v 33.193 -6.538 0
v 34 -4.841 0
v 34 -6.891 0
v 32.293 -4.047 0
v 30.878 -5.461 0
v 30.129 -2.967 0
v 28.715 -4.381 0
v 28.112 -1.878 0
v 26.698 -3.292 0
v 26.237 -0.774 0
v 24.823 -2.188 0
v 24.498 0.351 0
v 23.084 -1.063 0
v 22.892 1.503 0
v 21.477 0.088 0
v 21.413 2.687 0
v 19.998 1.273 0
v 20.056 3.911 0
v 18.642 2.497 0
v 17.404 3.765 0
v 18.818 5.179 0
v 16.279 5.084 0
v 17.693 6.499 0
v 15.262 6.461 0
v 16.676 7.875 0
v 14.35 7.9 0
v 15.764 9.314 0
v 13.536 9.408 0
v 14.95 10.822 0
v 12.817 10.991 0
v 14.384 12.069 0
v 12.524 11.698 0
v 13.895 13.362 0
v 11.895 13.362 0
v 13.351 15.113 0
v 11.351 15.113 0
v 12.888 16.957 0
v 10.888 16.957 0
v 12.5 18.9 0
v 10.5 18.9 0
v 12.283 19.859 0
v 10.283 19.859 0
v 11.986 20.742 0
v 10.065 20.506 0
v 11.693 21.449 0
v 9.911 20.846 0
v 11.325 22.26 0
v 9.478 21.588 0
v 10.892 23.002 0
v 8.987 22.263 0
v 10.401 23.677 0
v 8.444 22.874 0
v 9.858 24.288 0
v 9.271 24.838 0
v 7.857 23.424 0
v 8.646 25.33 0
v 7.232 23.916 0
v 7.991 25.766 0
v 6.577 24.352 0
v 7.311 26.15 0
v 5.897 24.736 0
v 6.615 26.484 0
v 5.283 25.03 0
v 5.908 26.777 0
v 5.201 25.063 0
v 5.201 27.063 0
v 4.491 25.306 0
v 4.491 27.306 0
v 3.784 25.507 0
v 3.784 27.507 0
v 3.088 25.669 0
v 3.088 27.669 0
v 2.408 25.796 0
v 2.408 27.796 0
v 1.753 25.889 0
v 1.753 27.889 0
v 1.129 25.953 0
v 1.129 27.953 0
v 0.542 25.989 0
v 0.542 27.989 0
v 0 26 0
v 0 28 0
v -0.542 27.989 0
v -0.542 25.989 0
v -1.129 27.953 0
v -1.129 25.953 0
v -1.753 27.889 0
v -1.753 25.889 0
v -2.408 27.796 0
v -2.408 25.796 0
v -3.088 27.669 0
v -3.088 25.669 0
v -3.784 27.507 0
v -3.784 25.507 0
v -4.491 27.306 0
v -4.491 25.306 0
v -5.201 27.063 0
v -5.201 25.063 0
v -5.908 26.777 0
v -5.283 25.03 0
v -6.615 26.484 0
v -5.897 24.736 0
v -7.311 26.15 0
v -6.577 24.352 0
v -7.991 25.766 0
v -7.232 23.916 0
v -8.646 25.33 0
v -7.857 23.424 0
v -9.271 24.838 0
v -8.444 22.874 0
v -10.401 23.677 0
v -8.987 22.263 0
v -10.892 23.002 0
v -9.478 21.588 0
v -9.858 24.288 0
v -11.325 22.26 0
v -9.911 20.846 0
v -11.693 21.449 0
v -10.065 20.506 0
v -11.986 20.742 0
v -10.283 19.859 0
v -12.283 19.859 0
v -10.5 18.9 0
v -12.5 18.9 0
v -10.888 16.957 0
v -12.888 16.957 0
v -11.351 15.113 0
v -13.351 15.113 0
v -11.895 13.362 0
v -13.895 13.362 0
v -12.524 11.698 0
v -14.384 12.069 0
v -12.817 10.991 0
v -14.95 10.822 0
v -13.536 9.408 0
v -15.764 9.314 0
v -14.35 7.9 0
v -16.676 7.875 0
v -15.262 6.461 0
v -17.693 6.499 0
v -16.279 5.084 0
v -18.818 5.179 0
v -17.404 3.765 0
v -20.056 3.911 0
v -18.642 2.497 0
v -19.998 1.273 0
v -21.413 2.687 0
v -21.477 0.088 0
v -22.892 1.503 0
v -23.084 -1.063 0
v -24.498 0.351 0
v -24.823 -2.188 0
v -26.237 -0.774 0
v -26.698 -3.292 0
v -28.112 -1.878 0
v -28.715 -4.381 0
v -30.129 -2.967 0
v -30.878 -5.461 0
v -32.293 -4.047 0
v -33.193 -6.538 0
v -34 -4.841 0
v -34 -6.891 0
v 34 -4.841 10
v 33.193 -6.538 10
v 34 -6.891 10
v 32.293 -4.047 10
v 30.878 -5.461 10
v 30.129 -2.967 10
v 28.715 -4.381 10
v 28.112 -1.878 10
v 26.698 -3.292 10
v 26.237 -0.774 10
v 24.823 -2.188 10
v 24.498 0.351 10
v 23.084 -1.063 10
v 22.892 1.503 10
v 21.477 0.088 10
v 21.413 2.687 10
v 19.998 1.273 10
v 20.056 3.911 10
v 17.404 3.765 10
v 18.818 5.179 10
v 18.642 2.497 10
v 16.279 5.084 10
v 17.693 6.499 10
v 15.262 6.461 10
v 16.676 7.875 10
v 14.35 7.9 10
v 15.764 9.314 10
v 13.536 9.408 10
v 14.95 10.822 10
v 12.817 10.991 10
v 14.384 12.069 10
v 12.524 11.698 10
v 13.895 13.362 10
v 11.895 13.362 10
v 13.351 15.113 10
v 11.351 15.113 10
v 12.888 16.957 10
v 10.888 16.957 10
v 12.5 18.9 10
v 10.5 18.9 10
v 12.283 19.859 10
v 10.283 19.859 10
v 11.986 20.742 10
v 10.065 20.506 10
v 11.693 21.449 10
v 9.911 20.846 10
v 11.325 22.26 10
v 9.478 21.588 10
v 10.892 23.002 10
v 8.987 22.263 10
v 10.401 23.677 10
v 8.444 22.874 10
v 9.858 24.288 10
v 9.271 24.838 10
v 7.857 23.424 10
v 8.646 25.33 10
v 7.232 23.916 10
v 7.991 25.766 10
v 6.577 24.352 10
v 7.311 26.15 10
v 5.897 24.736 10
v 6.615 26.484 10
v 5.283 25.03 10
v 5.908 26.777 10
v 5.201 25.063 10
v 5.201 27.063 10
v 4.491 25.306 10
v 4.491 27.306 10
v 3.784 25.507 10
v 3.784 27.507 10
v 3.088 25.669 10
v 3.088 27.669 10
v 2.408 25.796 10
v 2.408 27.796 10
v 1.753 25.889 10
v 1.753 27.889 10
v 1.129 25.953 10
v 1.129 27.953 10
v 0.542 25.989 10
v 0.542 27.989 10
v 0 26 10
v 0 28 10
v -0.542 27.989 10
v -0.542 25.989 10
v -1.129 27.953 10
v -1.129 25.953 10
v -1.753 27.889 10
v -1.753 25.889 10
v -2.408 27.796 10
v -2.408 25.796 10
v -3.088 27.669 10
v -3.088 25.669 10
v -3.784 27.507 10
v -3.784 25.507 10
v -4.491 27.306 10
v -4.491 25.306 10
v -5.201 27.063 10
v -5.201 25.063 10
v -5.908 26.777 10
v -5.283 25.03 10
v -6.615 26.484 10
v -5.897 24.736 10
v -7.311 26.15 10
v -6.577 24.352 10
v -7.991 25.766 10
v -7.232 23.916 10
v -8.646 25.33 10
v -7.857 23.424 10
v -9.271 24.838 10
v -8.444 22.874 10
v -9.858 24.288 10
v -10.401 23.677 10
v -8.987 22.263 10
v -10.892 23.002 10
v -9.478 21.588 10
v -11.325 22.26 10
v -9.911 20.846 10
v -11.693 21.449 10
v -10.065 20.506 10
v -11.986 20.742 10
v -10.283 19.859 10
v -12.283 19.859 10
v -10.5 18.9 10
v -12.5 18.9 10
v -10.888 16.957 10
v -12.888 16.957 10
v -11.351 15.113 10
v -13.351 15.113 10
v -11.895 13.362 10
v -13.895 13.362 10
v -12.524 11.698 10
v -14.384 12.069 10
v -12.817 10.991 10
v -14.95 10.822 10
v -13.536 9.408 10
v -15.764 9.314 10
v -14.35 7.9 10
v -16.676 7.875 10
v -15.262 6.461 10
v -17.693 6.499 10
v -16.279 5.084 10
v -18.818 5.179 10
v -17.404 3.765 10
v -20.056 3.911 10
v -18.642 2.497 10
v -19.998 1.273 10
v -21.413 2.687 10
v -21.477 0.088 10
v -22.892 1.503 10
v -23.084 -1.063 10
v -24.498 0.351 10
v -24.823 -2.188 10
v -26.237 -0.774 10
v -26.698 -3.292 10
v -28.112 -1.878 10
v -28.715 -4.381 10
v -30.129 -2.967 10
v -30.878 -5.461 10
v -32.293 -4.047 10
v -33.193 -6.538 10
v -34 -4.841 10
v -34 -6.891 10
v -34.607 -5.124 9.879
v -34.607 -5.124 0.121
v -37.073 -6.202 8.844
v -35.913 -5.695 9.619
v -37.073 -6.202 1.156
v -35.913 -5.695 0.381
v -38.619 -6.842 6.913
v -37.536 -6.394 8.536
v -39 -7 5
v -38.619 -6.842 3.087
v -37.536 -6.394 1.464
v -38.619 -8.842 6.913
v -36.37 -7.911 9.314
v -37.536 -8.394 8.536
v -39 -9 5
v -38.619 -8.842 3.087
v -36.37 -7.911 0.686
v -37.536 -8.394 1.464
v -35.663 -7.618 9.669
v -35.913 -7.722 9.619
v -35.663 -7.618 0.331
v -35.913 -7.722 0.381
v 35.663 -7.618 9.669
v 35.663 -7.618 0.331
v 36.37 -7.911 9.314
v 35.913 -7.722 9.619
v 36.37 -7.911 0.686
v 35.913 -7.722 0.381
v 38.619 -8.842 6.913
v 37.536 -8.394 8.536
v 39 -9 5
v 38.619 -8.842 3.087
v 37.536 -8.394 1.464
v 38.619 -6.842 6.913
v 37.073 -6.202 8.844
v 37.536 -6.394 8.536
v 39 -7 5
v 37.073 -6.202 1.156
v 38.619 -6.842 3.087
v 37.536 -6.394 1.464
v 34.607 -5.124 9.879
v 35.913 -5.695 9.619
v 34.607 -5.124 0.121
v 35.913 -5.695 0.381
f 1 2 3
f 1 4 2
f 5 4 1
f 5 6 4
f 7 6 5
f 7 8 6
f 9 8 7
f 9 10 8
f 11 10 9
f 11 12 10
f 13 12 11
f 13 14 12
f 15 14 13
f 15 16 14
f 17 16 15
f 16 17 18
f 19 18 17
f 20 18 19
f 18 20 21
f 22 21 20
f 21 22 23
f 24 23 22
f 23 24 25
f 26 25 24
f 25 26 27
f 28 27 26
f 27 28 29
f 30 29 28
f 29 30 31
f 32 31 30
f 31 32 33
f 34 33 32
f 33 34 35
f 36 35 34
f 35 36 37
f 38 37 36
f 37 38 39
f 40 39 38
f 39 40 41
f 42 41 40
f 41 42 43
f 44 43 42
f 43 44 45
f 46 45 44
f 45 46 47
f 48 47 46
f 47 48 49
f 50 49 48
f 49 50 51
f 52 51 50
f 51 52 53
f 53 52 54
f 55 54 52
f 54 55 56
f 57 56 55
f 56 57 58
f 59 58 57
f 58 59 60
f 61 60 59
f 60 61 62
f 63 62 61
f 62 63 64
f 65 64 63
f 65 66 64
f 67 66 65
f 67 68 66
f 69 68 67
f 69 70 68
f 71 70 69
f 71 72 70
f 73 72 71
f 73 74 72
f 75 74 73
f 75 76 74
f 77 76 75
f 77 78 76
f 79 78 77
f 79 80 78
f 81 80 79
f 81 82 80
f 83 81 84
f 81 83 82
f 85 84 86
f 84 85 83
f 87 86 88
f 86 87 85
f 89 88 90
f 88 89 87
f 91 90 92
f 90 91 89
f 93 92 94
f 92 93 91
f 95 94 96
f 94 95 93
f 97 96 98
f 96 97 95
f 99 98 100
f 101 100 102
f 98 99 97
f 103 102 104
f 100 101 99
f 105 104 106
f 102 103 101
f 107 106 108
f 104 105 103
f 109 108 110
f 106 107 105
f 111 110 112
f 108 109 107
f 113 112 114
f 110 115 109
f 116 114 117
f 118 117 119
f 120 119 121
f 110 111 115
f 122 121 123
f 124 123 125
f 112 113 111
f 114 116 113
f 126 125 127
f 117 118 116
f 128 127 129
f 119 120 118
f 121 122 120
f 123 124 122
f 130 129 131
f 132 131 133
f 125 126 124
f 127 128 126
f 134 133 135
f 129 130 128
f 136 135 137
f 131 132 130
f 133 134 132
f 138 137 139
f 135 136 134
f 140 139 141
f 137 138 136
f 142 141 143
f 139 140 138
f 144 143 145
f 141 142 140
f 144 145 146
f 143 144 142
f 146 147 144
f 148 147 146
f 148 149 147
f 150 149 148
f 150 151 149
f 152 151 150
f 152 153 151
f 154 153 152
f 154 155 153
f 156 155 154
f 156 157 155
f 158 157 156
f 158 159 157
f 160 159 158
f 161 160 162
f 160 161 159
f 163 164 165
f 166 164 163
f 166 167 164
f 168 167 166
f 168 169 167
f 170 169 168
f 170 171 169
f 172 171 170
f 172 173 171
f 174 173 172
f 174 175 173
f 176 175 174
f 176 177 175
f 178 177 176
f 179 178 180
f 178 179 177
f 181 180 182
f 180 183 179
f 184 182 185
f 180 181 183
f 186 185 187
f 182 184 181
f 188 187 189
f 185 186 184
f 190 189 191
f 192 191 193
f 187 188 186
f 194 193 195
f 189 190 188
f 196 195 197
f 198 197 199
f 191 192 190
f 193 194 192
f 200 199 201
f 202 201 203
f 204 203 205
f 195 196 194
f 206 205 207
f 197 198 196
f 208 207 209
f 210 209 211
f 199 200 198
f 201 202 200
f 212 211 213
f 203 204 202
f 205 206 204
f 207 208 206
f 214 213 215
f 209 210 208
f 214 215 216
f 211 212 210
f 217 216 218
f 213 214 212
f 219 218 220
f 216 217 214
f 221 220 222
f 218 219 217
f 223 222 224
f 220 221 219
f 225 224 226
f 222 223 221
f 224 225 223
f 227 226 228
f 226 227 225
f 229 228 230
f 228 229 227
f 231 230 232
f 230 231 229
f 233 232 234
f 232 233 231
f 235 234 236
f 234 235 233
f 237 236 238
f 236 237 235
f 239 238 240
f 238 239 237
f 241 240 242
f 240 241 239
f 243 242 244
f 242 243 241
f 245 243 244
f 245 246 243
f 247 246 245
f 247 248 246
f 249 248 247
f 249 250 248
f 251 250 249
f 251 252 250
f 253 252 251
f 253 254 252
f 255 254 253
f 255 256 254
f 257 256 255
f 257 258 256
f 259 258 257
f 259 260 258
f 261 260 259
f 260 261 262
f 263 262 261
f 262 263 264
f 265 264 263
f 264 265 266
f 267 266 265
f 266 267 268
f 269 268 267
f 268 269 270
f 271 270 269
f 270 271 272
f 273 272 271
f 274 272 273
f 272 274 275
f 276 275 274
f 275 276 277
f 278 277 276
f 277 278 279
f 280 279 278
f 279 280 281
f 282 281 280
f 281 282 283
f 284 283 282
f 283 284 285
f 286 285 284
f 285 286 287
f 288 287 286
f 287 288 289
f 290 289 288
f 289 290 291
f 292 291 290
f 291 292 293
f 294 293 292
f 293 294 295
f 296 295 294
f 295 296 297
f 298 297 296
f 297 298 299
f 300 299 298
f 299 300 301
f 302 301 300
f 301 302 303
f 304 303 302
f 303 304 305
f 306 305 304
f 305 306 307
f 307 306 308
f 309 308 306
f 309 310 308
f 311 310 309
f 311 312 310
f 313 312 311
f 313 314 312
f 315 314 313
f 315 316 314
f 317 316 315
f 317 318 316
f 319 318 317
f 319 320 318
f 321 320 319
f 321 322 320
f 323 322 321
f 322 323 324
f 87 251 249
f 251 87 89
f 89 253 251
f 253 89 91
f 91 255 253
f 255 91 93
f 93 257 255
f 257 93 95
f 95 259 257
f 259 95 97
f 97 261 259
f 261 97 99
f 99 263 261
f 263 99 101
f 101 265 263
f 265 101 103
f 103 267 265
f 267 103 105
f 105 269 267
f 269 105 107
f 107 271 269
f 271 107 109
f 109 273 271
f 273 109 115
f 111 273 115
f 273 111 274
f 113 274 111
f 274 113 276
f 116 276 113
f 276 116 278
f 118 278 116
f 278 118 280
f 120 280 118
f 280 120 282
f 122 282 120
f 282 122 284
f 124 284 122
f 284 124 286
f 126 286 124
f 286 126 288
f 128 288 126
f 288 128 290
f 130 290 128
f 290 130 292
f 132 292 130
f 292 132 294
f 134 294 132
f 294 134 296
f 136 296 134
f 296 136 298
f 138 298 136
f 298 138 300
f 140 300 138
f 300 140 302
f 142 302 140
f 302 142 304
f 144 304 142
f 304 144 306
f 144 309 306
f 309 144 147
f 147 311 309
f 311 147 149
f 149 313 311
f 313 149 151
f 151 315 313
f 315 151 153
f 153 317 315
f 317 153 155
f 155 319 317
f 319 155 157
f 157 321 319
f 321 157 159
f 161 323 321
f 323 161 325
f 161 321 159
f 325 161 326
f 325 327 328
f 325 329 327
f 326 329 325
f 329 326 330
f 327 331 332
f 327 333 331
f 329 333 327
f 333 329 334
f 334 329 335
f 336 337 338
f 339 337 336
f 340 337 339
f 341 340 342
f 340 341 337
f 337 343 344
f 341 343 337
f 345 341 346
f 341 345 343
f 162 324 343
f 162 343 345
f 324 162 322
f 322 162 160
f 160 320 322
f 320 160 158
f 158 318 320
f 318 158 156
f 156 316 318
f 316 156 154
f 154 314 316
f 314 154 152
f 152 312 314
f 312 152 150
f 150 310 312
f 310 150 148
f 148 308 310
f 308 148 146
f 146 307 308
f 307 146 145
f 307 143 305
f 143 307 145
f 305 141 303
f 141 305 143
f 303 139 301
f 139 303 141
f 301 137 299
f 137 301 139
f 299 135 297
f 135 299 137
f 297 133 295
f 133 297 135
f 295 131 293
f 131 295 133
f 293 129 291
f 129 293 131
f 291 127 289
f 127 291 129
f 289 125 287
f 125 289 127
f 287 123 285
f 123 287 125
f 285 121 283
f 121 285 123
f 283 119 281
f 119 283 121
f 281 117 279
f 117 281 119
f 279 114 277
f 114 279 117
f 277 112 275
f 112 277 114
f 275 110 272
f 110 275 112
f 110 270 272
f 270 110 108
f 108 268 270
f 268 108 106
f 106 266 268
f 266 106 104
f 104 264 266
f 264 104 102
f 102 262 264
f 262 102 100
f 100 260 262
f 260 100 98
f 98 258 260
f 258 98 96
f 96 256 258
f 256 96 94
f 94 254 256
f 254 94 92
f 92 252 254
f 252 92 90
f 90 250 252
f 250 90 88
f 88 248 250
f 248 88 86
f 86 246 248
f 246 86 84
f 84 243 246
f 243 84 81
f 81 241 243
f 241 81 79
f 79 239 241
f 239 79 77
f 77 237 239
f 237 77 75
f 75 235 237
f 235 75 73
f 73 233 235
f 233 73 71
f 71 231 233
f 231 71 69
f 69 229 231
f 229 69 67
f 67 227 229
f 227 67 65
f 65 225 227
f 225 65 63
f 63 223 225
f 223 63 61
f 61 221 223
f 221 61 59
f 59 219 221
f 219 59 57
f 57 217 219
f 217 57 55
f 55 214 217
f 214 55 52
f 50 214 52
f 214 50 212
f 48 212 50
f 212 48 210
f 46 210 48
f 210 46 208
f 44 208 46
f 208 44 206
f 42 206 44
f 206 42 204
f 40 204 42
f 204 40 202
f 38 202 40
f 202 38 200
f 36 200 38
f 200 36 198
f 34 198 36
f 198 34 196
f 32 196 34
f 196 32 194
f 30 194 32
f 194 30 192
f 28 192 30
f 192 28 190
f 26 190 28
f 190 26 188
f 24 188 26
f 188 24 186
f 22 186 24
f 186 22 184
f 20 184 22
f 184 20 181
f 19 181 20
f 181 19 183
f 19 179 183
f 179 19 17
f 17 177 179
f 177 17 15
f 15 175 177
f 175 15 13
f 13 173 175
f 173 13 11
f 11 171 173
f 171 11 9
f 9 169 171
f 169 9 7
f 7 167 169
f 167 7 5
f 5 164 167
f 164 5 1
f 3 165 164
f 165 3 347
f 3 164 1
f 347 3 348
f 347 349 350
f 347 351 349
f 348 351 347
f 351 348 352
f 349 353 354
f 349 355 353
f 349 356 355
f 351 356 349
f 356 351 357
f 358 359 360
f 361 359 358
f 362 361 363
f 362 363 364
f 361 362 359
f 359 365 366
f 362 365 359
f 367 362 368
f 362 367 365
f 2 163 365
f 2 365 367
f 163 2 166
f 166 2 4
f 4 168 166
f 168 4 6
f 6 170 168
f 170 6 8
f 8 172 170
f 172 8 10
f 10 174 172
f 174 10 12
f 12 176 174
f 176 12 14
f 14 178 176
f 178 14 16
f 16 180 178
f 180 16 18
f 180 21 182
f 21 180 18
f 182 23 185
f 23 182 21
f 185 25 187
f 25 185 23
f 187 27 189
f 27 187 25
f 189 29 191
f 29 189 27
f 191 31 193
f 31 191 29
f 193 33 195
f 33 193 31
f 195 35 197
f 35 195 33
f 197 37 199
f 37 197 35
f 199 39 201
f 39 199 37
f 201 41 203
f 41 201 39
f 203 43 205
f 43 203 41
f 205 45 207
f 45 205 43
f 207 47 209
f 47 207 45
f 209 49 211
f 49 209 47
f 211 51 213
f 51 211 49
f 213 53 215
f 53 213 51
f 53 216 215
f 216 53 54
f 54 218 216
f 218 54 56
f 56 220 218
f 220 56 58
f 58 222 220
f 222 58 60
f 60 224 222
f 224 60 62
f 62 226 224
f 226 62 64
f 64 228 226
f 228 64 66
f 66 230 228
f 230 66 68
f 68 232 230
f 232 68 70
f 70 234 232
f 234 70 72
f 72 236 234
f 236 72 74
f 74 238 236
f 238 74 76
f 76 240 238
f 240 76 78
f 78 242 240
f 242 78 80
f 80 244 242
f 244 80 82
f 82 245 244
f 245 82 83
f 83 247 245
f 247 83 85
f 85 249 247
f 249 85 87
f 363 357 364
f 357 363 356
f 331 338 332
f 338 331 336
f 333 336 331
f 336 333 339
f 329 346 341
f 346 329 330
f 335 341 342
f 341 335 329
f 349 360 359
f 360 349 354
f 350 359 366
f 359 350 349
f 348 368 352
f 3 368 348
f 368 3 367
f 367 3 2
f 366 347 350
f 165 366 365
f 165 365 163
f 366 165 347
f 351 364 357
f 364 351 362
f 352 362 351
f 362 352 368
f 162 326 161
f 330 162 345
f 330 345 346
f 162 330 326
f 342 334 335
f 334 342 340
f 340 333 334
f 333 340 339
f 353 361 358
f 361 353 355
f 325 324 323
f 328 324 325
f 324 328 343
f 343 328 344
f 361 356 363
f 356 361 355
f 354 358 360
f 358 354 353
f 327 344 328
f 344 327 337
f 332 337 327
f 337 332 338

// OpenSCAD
// This file was processed by resolve-include.py [https://github.com/arpruss/miscellaneous-scad/blob/master/scripts/resolve-include.py] 
// to include  all the dependencies inside one file.

d1 = 23;
d3 = 78;
depth = 27;
extraDepth = 8;
angle1 = 10;
angle2 = 22;
thickness = 2;
height = 10;

module end_of_parameters_dummy() {}


//BEGIN DEPENDENCY: use <Bezier.scad>;
/*
Copyright (c) 2017 Alexander R. Pruss.

Licensed under any Creative Commons Attribution license you like or under the
following MIT License.

Permission is hereby granted, free of charge, to any person obtaining a copy
of this software and associated documentation files (the "Software"), to deal
in the Software without restriction, including without limitation the rights
to use, copy, modify, merge, publish, distribute, sublicense, and/or sell
copies of the Software, and to permit persons to whom the Software is
furnished to do so, subject to the following conditions:

The above copyright notice and this permission notice shall be included in all
copies or substantial portions of the Software.

THE SOFTWARE IS PROVIDED "AS IS", WITHOUT WARRANTY OF ANY KIND, EXPRESS OR
IMPLIED, INCLUDING BUT NOT LIMITED TO THE WARRANTIES OF MERCHANTABILITY,
FITNESS FOR A PARTICULAR PURPOSE AND NONINFRINGEMENT. IN NO EVENT SHALL THE
AUTHORS OR COPYRIGHT HOLDERS BE LIABLE FOR ANY CLAIM, DAMAGES OR OTHER
LIABILITY, WHETHER IN AN ACTION OF CONTRACT, TORT OR OTHERWISE, ARISING FROM,
OUT OF OR IN CONNECTION WITH THE SOFTWARE OR THE USE OR OTHER DEALINGS IN THE
SOFTWARE.

*/


// Public domain Bezier stuff from www.thingiverse.com/thing:8443
function BEZ03(u) = pow(1-u, 3);
function BEZ13(u) = 3*u*pow(1-u,2);
function BEZ23(u) = 3*pow(u,2)*(1-u);
function BEZ33(u) = pow(u,3);
function PointAlongBez4(p0, p1, p2, p3, u) =
	BEZ03(u)*p0+BEZ13(u)*p1+BEZ23(u)*p2+BEZ33(u)*p3;
// End public domain Bezier stuff
function d2BEZ03(u) = 6*(1-u);
function d2BEZ13(u) = 18*u-12;
function d2BEZ23(u) = -18*u+6;
function d2BEZ33(u) = 6*u;

function worstCase2ndDerivative(p0, p1, p2, p3, u1, u2)
    = norm([
        for(i=[0:len(p0)-1])
            max([for(u=[u1,u2])
                d2BEZ03(u)*p0[i]+d2BEZ13(u)*p1[i]+
                d2BEZ23(u)*p2[i]+d2BEZ33(u)*p3[i]]) ]);

function neededIntervalLength(p0,p1,p2,p3,u1,u2,tolerance)
    = let(d2=worstCase2ndDerivative(p0,p1,p2,p3,u1,u2))
        d2==0 ? u2-u1+1 : sqrt(2*tolerance/d2);

function REPEAT_MIRRORED(v,angleStart=0,angleEnd=360) = ["m",v,angleStart,angleEnd];
function SMOOTH_REL(x) = ["r",x];
function SMOOTH_ABS(x) = ["a",x];
function SYMMETRIC() = ["r",1];
function OFFSET(v) = ["o",v];
function SHARP() = OFFSET([0,0,0]);
function LINE() = ["l",0];
function POLAR(r,angle) = OFFSET(r*[cos(angle),sin(angle)]);
//function POINT_IS_SPECIAL(v) = (v[0]=="r" || v[0]=="a" || v[0]=="o" || v[0]=="l");

// this does NOT handle offset type points; to handle those, use DecodeBezierOffsets()
function getControlPoint(cp,node,otherCP,otherNode,nextNode) =
    let(v=node-otherCP) (
    cp[0]=="r" ? node+cp[1]*v:
    cp[0]=="a" ? (
        norm(v)<1e-9 ? node+cp[1]*(node-otherNode)/norm(node-otherNode) : node+cp[1]*v/norm(v) ) :
        cp );

function onLine2(a,b,c,eps=1e-4) =
    norm(c-a) <= eps ? true
        : norm(b-a) <= eps ? false /* to be safe */
            : abs((c[1]-a[1])*(b[0]-a[0]) - (b[1]-a[1])*(c[0]-a[0])) <= eps * eps && norm(c-a) <= eps + norm(b-a);

function isStraight2(p1,c1,c2,p2,eps=1e-4) =
    len(p1) == 2 &&
    onLine2(p1,p2,c1,eps=eps) && onLine2(p2,p1,c2,eps=eps);

function Bezier2(p,index=0,precision=0.05,rightEndPoint=true,optimize=true) = let(nPoints=
        max(1, precision < 0 ?
                    ceil(1/
                        neededIntervalLength(p[index],p[index+1],p[index+2],p[index+3],0,1,-precision))
                    : ceil(1/precision)) )
    optimize && isStraight2(p[index],p[index+1],p[index+2],p[index+3]) ? (rightEndPoint?[p[index+0],p[index+3]]:[p[index+0]] ) :
    [for (i=[0:nPoints-(rightEndPoint?0:1)]) PointAlongBez4(p[index+0],p[index+1],p[index+2],p[index+3],i/nPoints)];

function flatten(listOfLists) = [ for(list = listOfLists) for(item = list) item ];


// p is a list of points, in the format:
// [node1,control1,control2,node2,control3, control4,node3, ...]
// You can replace inner control points with:
//   SYMMETRIC: uses a reflection of the control point on the other side of the node
//   SMOOTH_REL(x): like SYMMETRIC, but the distance of the control point to the node is x times the distance of the other control point to the node
//   SMOOTH_ABS(x): like SYMMETRIC, but the distance of the control point to the node is exactly x
// You can also replace any control point with:
//   OFFSET(v): puts the control point at the corresponding node plus the vector v
//   SHARP(): equivalent to OFFSET([0,0])
//   LINE(): when used for both control points between two nodes, generates a straight line
//   POLAR(r,angle): like OFFSET, except the offset is specified in polar coordinates

function DecodeBezierOffset(control,node) = control[0] == "o" ? node+control[1] : control;

function _mirrorMatrix(normalVector) = let(v = normalVector/norm(normalVector)) len(v)<3 ? [[1-2*v[0]*v[0],-2*v[0]*v[1]],[-2*v[0]*v[1],1-2*v[1]*v[1]]] : [[1-2*v[0]*v[0],-2*v[0]*v[1],-2*v[0]*v[2]],[-2*v[0]*v[1],1-2*v[1]*v[1],-2*v[1]*v[2]],[-2*v[0]*v[2],-2*v[1]*v[2],1-2*v[2]*v[2]]];

function _correctLength(p,start=0) =
    start >= len(p) || p[start][0] == "m" ? 3*floor(start/3)+1 : _correctLength(p,start=start+1);

function _trimArray(a, n) = [for (i=[0:n-1]) a[i]];

function _transformPoint(matrix,a) =
    let(n=len(a))
        len(matrix[0])==n+1 ?
            _trimArray(matrix * concat(a,[1]), n)
            : matrix * a;

function _transformPath(matrix,path) =
    [for (a=path) _transformPoint(matrix,a)];

function _reverseArray(array) = let(n=len(array)) [for (i=[0:n-1]) array[n-1-i]];

function _stitchPaths(a,b) = let(na=len(a)) [for (i=[0:na+len(b)-2]) i<na? a[i] : b[i-na+1]-b[0]+a[na-1]];

// replace all OFFSET/SHARP/POLAR points with coordinates
function DecodeBezierOffsets(p) = [for (i=[0:_correctLength(p)-1]) i%3==0?p[i]:(i%3==1?DecodeBezierOffset(p[i],p[i-1]):DecodeBezierOffset(p[i],p[i+1]))];

function _mirrorPaths(basePath, control, start) =
    control[start][0] == "m" ? _mirrorPaths(_stitchPaths(basePath,_reverseArray(_transformPath(_mirrorMatrix( control[start][1] ),basePath))), control, start+1) : basePath;

function DecodeMirrored(path,start=0) =
    start >= len(path) ? path :
    path[start][0] == "m" ? _mirrorPaths([for(i=[0:1:start-1]) path[i]], path, start) :
        DecodeMirrored(path,start=start+1);

function DecodeLines(p) = [for (i=[0:len(p)-1])
    i%3==0 || p[i][0] != "l" ? p[i] :
    i%3 == 1 ? (p[i-1]*2+p[i+2])/3 :
    (p[i-2]+p[i+1]*2)/3 ];

function DecodeSpecialBezierPoints(p0) =
    let(
        l = _correctLength(p0),
        doMirror = len(p0)>l && p0[l][0] == "m",
        p1=DecodeLines(p0),
        p=DecodeBezierOffsets(p1),
        basePath = [for (i=[0:l-1]) i%3==0?p[i]:(i%3==1?getControlPoint(p[i],p[i-1],p[i-2],p[i-4],p[i+2]):getControlPoint(p[i],p[i+1],p[i+2],p[i+4],p[i-2]))])
        doMirror ? _mirrorPaths(basePath, p0, l) : basePath;

function Distance2D(a,b) = sqrt((a[0]-b[0])*(a[0]-b[0])+(a[1]-b[1])*(a[1]-b[1]));

function RemoveDuplicates(p,eps=0.00001) = let(safeEps = eps/len(p)) [for (i=[0:len(p)-1]) if(i==0 || i==len(p)-1 || Distance2D(p[i-1],p[i]) >= safeEps) p[i]];

function Bezier(p,precision=0.05,eps=0.00001,optimize=true) = let(q=DecodeSpecialBezierPoints(p), nodes=(len(q)-1)/3) RemoveDuplicates(flatten([for (i=[0:nodes-1]) Bezier2(q,optimize=optimize,index=i*3,precision=precision,rightEndPoint=(i==nodes-1))]),eps=eps);

function GetSplineAngle(a,b,c) =
    a==c && b==a ? 0 :
    a==c ? let(ba=b-a) atan2(ba[1],ba[0]) :
    let(ca=c-a) atan2(ca[1],ca[0]);

/*    let(ba=norm(b-a),cb=norm(c-b))
        ba == 0 && cb == 0 ? 0 :
    let(v = ba == 0 ? c-b :
            cb == 0 ? b-a :
            (c-b)*norm(b-a)/norm(c-b)+(b-a))
    atan2(v[1],v[0]); */

// do a spline around b
function SplineAroundPoint(a,b,c,tension=0.5,includeLeftCP=true,includeRightCP=true) =
    includeLeftCP && includeRightCP ?
        [POLAR(tension*norm(a-b),GetSplineAngle(c,b,a)),b,POLAR(tension*norm(c-b),GetSplineAngle(a,b,c))] :
    includeLeftCP ?
        [POLAR(tension*norm(a-b),GetSplineAngle(c,b,a)),b] :
    includeRightCP ?
        [b,POLAR(tension*norm(c-b),GetSplineAngle(a,b,c))] :
        [b];

function mod(n,m) = let(q=n%m) q>=0 ? q : m+q;

function _unit(v) = norm(v)==0 ? [for(x=v) 0] : v/norm(v);

function _corner(p0,p1,p2,offset=2,tension=0.448084975506) =
    [p1-_unit(p1-p0)*offset,
    p1-_unit(p1-p0)*offset*(1-tension),
    p1-_unit(p1-p2)*offset*(1-tension),
    p1-_unit(p1-p2)*offset,
    LINE(),LINE()];

function _roundPathRaw(path,start,end,offset=2,tension=0.551915024494) =
    let(n=len(path),
        p2=_mirrorPaths(path))
        [for(p=[for(i=[start:1:end-1]) _corner(p2[mod(i-1,n)],p2[i],path[mod(i+1,n)],offset=offset,tension=tension)]) for(q=p) q];

function PathToBezier(path,offset=2,tension=0.551915024494,closed=false) =
    let(p1=DecodeMirrored(path),
        n=len(p1))
        offset==0 && tension==0 ?
        p1 :
        !closed ? concat([p1[0],LINE(),LINE()], _roundPathRaw(p1,1,n-1,offset=offset,tension=tension), [p1[n-1]]) :
        let(p2 = _roundPathRaw(p1,0,n,offset=offset,tension=tension),
            n2 = len(p2))
        [for(i=[0:1:n2-3]) p2[mod(i,n2)]];
function BezierSmoothPoints(points,tension=0.5,closed=false)
    = let (n=len(points))
        flatten(
        closed ? [ for (i=[0:n]) SplineAroundPoint(points[(n+i-1)%n],points[i%n],points[(i+1)%n],tension=tension,includeLeftCP=i>0,includeRightCP=i<n) ] :
        [ for (i=[0:n-1])
            SplineAroundPoint(
            i==0 ? 2*points[0]-points[1] : points[(n+i-1)%n],
            points[i],
            i==n-1 ? 2*points[n-1]-points[n-2] : points[(i+1)%n],tension=tension,includeLeftCP=i>0,includeRightCP=i<n-1  ) ]);

module BezierVisualize(p,precision=0.05,eps=0.00001,lineThickness=0.25,controlLineThickness=0.125,nodeSize=1) {
    $fn = 16;
    dim = len(p[0]);
    module point(size) {
        if (dim==2)
            circle(d=size);
        else
            sphere(d=size);
    }
    p1 = DecodeSpecialBezierPoints(p);
    l = Bezier(p1,precision=precision,eps=eps);
    for (i=[0:len(l)-2]) {
        hull() {
            translate(l[i]) point(lineThickness);
            translate(l[i+1]) point(lineThickness);
        }
    }
    for (i=[0:len(p1)-1]) {
        if (i%3 == 0) {
            color("black") translate(p1[i]) point(nodeSize);
        }
        else {
            node = i%3 == 1 ? i-1 : i+1;
            color("red") translate(p1[i]) point(nodeSize);
            color("red") hull() {
                translate(p1[node]) point(controlLineThickness);
                translate(p1[i]) point(controlLineThickness);
            }
        }
    }
}


//END DEPENDENCY: use <Bezier.scad>;


//BEGIN DEPENDENCY: use <ribbon.scad>;
module ribbon(points, thickness=1, closed=false) {
    p = closed ? concat(points, [points[0]]) : points;

    union() {
        for (i=[1:len(p)-1]) {
            hull() {
                translate(p[i-1])
                    if ($children==0)
                        circle(d=thickness, $fn=8);
                    else
                        children();
                translate(p[i])
                    if ($children==0)
                        circle(d=thickness, $fn=8);
                    else
                        children();
            }
        }
    }
}

pi = 3.1415926535897932;
function SIN(theta) = sin(theta * 180 / pi);
function COS(theta) = cos(theta * 180 / pi);
function TAN(theta) = tan(theta * 180 / pi);



//END DEPENDENCY: use <ribbon.scad>;



noseB=[[-d3/2, -extraDepth],POLAR(d3/4,angle2),
    POLAR(depth/2,-90-angle1),  [-d1/2,depth*.7], SMOOTH_REL(.5), POLAR(d1*.15,180),[0,depth],REPEAT_MIRRORED([1,0])];

module rounder() {
    translate([0,-extraDepth-thickness/2,height/2])
    rotate([-90,0,0])
    linear_extrude(height=depth+extraDepth+thickness*2)
    hull() {
        translate([-d3/2+height/2,0]) circle(d=height,$fn=16);
        translate([d3/2-height/2,0]) circle(d=height,$fn=16);
    }
}

intersection() {
linear_extrude(height=height) ribbon(Bezier(noseB),thickness=thickness);
    rounder();
}
